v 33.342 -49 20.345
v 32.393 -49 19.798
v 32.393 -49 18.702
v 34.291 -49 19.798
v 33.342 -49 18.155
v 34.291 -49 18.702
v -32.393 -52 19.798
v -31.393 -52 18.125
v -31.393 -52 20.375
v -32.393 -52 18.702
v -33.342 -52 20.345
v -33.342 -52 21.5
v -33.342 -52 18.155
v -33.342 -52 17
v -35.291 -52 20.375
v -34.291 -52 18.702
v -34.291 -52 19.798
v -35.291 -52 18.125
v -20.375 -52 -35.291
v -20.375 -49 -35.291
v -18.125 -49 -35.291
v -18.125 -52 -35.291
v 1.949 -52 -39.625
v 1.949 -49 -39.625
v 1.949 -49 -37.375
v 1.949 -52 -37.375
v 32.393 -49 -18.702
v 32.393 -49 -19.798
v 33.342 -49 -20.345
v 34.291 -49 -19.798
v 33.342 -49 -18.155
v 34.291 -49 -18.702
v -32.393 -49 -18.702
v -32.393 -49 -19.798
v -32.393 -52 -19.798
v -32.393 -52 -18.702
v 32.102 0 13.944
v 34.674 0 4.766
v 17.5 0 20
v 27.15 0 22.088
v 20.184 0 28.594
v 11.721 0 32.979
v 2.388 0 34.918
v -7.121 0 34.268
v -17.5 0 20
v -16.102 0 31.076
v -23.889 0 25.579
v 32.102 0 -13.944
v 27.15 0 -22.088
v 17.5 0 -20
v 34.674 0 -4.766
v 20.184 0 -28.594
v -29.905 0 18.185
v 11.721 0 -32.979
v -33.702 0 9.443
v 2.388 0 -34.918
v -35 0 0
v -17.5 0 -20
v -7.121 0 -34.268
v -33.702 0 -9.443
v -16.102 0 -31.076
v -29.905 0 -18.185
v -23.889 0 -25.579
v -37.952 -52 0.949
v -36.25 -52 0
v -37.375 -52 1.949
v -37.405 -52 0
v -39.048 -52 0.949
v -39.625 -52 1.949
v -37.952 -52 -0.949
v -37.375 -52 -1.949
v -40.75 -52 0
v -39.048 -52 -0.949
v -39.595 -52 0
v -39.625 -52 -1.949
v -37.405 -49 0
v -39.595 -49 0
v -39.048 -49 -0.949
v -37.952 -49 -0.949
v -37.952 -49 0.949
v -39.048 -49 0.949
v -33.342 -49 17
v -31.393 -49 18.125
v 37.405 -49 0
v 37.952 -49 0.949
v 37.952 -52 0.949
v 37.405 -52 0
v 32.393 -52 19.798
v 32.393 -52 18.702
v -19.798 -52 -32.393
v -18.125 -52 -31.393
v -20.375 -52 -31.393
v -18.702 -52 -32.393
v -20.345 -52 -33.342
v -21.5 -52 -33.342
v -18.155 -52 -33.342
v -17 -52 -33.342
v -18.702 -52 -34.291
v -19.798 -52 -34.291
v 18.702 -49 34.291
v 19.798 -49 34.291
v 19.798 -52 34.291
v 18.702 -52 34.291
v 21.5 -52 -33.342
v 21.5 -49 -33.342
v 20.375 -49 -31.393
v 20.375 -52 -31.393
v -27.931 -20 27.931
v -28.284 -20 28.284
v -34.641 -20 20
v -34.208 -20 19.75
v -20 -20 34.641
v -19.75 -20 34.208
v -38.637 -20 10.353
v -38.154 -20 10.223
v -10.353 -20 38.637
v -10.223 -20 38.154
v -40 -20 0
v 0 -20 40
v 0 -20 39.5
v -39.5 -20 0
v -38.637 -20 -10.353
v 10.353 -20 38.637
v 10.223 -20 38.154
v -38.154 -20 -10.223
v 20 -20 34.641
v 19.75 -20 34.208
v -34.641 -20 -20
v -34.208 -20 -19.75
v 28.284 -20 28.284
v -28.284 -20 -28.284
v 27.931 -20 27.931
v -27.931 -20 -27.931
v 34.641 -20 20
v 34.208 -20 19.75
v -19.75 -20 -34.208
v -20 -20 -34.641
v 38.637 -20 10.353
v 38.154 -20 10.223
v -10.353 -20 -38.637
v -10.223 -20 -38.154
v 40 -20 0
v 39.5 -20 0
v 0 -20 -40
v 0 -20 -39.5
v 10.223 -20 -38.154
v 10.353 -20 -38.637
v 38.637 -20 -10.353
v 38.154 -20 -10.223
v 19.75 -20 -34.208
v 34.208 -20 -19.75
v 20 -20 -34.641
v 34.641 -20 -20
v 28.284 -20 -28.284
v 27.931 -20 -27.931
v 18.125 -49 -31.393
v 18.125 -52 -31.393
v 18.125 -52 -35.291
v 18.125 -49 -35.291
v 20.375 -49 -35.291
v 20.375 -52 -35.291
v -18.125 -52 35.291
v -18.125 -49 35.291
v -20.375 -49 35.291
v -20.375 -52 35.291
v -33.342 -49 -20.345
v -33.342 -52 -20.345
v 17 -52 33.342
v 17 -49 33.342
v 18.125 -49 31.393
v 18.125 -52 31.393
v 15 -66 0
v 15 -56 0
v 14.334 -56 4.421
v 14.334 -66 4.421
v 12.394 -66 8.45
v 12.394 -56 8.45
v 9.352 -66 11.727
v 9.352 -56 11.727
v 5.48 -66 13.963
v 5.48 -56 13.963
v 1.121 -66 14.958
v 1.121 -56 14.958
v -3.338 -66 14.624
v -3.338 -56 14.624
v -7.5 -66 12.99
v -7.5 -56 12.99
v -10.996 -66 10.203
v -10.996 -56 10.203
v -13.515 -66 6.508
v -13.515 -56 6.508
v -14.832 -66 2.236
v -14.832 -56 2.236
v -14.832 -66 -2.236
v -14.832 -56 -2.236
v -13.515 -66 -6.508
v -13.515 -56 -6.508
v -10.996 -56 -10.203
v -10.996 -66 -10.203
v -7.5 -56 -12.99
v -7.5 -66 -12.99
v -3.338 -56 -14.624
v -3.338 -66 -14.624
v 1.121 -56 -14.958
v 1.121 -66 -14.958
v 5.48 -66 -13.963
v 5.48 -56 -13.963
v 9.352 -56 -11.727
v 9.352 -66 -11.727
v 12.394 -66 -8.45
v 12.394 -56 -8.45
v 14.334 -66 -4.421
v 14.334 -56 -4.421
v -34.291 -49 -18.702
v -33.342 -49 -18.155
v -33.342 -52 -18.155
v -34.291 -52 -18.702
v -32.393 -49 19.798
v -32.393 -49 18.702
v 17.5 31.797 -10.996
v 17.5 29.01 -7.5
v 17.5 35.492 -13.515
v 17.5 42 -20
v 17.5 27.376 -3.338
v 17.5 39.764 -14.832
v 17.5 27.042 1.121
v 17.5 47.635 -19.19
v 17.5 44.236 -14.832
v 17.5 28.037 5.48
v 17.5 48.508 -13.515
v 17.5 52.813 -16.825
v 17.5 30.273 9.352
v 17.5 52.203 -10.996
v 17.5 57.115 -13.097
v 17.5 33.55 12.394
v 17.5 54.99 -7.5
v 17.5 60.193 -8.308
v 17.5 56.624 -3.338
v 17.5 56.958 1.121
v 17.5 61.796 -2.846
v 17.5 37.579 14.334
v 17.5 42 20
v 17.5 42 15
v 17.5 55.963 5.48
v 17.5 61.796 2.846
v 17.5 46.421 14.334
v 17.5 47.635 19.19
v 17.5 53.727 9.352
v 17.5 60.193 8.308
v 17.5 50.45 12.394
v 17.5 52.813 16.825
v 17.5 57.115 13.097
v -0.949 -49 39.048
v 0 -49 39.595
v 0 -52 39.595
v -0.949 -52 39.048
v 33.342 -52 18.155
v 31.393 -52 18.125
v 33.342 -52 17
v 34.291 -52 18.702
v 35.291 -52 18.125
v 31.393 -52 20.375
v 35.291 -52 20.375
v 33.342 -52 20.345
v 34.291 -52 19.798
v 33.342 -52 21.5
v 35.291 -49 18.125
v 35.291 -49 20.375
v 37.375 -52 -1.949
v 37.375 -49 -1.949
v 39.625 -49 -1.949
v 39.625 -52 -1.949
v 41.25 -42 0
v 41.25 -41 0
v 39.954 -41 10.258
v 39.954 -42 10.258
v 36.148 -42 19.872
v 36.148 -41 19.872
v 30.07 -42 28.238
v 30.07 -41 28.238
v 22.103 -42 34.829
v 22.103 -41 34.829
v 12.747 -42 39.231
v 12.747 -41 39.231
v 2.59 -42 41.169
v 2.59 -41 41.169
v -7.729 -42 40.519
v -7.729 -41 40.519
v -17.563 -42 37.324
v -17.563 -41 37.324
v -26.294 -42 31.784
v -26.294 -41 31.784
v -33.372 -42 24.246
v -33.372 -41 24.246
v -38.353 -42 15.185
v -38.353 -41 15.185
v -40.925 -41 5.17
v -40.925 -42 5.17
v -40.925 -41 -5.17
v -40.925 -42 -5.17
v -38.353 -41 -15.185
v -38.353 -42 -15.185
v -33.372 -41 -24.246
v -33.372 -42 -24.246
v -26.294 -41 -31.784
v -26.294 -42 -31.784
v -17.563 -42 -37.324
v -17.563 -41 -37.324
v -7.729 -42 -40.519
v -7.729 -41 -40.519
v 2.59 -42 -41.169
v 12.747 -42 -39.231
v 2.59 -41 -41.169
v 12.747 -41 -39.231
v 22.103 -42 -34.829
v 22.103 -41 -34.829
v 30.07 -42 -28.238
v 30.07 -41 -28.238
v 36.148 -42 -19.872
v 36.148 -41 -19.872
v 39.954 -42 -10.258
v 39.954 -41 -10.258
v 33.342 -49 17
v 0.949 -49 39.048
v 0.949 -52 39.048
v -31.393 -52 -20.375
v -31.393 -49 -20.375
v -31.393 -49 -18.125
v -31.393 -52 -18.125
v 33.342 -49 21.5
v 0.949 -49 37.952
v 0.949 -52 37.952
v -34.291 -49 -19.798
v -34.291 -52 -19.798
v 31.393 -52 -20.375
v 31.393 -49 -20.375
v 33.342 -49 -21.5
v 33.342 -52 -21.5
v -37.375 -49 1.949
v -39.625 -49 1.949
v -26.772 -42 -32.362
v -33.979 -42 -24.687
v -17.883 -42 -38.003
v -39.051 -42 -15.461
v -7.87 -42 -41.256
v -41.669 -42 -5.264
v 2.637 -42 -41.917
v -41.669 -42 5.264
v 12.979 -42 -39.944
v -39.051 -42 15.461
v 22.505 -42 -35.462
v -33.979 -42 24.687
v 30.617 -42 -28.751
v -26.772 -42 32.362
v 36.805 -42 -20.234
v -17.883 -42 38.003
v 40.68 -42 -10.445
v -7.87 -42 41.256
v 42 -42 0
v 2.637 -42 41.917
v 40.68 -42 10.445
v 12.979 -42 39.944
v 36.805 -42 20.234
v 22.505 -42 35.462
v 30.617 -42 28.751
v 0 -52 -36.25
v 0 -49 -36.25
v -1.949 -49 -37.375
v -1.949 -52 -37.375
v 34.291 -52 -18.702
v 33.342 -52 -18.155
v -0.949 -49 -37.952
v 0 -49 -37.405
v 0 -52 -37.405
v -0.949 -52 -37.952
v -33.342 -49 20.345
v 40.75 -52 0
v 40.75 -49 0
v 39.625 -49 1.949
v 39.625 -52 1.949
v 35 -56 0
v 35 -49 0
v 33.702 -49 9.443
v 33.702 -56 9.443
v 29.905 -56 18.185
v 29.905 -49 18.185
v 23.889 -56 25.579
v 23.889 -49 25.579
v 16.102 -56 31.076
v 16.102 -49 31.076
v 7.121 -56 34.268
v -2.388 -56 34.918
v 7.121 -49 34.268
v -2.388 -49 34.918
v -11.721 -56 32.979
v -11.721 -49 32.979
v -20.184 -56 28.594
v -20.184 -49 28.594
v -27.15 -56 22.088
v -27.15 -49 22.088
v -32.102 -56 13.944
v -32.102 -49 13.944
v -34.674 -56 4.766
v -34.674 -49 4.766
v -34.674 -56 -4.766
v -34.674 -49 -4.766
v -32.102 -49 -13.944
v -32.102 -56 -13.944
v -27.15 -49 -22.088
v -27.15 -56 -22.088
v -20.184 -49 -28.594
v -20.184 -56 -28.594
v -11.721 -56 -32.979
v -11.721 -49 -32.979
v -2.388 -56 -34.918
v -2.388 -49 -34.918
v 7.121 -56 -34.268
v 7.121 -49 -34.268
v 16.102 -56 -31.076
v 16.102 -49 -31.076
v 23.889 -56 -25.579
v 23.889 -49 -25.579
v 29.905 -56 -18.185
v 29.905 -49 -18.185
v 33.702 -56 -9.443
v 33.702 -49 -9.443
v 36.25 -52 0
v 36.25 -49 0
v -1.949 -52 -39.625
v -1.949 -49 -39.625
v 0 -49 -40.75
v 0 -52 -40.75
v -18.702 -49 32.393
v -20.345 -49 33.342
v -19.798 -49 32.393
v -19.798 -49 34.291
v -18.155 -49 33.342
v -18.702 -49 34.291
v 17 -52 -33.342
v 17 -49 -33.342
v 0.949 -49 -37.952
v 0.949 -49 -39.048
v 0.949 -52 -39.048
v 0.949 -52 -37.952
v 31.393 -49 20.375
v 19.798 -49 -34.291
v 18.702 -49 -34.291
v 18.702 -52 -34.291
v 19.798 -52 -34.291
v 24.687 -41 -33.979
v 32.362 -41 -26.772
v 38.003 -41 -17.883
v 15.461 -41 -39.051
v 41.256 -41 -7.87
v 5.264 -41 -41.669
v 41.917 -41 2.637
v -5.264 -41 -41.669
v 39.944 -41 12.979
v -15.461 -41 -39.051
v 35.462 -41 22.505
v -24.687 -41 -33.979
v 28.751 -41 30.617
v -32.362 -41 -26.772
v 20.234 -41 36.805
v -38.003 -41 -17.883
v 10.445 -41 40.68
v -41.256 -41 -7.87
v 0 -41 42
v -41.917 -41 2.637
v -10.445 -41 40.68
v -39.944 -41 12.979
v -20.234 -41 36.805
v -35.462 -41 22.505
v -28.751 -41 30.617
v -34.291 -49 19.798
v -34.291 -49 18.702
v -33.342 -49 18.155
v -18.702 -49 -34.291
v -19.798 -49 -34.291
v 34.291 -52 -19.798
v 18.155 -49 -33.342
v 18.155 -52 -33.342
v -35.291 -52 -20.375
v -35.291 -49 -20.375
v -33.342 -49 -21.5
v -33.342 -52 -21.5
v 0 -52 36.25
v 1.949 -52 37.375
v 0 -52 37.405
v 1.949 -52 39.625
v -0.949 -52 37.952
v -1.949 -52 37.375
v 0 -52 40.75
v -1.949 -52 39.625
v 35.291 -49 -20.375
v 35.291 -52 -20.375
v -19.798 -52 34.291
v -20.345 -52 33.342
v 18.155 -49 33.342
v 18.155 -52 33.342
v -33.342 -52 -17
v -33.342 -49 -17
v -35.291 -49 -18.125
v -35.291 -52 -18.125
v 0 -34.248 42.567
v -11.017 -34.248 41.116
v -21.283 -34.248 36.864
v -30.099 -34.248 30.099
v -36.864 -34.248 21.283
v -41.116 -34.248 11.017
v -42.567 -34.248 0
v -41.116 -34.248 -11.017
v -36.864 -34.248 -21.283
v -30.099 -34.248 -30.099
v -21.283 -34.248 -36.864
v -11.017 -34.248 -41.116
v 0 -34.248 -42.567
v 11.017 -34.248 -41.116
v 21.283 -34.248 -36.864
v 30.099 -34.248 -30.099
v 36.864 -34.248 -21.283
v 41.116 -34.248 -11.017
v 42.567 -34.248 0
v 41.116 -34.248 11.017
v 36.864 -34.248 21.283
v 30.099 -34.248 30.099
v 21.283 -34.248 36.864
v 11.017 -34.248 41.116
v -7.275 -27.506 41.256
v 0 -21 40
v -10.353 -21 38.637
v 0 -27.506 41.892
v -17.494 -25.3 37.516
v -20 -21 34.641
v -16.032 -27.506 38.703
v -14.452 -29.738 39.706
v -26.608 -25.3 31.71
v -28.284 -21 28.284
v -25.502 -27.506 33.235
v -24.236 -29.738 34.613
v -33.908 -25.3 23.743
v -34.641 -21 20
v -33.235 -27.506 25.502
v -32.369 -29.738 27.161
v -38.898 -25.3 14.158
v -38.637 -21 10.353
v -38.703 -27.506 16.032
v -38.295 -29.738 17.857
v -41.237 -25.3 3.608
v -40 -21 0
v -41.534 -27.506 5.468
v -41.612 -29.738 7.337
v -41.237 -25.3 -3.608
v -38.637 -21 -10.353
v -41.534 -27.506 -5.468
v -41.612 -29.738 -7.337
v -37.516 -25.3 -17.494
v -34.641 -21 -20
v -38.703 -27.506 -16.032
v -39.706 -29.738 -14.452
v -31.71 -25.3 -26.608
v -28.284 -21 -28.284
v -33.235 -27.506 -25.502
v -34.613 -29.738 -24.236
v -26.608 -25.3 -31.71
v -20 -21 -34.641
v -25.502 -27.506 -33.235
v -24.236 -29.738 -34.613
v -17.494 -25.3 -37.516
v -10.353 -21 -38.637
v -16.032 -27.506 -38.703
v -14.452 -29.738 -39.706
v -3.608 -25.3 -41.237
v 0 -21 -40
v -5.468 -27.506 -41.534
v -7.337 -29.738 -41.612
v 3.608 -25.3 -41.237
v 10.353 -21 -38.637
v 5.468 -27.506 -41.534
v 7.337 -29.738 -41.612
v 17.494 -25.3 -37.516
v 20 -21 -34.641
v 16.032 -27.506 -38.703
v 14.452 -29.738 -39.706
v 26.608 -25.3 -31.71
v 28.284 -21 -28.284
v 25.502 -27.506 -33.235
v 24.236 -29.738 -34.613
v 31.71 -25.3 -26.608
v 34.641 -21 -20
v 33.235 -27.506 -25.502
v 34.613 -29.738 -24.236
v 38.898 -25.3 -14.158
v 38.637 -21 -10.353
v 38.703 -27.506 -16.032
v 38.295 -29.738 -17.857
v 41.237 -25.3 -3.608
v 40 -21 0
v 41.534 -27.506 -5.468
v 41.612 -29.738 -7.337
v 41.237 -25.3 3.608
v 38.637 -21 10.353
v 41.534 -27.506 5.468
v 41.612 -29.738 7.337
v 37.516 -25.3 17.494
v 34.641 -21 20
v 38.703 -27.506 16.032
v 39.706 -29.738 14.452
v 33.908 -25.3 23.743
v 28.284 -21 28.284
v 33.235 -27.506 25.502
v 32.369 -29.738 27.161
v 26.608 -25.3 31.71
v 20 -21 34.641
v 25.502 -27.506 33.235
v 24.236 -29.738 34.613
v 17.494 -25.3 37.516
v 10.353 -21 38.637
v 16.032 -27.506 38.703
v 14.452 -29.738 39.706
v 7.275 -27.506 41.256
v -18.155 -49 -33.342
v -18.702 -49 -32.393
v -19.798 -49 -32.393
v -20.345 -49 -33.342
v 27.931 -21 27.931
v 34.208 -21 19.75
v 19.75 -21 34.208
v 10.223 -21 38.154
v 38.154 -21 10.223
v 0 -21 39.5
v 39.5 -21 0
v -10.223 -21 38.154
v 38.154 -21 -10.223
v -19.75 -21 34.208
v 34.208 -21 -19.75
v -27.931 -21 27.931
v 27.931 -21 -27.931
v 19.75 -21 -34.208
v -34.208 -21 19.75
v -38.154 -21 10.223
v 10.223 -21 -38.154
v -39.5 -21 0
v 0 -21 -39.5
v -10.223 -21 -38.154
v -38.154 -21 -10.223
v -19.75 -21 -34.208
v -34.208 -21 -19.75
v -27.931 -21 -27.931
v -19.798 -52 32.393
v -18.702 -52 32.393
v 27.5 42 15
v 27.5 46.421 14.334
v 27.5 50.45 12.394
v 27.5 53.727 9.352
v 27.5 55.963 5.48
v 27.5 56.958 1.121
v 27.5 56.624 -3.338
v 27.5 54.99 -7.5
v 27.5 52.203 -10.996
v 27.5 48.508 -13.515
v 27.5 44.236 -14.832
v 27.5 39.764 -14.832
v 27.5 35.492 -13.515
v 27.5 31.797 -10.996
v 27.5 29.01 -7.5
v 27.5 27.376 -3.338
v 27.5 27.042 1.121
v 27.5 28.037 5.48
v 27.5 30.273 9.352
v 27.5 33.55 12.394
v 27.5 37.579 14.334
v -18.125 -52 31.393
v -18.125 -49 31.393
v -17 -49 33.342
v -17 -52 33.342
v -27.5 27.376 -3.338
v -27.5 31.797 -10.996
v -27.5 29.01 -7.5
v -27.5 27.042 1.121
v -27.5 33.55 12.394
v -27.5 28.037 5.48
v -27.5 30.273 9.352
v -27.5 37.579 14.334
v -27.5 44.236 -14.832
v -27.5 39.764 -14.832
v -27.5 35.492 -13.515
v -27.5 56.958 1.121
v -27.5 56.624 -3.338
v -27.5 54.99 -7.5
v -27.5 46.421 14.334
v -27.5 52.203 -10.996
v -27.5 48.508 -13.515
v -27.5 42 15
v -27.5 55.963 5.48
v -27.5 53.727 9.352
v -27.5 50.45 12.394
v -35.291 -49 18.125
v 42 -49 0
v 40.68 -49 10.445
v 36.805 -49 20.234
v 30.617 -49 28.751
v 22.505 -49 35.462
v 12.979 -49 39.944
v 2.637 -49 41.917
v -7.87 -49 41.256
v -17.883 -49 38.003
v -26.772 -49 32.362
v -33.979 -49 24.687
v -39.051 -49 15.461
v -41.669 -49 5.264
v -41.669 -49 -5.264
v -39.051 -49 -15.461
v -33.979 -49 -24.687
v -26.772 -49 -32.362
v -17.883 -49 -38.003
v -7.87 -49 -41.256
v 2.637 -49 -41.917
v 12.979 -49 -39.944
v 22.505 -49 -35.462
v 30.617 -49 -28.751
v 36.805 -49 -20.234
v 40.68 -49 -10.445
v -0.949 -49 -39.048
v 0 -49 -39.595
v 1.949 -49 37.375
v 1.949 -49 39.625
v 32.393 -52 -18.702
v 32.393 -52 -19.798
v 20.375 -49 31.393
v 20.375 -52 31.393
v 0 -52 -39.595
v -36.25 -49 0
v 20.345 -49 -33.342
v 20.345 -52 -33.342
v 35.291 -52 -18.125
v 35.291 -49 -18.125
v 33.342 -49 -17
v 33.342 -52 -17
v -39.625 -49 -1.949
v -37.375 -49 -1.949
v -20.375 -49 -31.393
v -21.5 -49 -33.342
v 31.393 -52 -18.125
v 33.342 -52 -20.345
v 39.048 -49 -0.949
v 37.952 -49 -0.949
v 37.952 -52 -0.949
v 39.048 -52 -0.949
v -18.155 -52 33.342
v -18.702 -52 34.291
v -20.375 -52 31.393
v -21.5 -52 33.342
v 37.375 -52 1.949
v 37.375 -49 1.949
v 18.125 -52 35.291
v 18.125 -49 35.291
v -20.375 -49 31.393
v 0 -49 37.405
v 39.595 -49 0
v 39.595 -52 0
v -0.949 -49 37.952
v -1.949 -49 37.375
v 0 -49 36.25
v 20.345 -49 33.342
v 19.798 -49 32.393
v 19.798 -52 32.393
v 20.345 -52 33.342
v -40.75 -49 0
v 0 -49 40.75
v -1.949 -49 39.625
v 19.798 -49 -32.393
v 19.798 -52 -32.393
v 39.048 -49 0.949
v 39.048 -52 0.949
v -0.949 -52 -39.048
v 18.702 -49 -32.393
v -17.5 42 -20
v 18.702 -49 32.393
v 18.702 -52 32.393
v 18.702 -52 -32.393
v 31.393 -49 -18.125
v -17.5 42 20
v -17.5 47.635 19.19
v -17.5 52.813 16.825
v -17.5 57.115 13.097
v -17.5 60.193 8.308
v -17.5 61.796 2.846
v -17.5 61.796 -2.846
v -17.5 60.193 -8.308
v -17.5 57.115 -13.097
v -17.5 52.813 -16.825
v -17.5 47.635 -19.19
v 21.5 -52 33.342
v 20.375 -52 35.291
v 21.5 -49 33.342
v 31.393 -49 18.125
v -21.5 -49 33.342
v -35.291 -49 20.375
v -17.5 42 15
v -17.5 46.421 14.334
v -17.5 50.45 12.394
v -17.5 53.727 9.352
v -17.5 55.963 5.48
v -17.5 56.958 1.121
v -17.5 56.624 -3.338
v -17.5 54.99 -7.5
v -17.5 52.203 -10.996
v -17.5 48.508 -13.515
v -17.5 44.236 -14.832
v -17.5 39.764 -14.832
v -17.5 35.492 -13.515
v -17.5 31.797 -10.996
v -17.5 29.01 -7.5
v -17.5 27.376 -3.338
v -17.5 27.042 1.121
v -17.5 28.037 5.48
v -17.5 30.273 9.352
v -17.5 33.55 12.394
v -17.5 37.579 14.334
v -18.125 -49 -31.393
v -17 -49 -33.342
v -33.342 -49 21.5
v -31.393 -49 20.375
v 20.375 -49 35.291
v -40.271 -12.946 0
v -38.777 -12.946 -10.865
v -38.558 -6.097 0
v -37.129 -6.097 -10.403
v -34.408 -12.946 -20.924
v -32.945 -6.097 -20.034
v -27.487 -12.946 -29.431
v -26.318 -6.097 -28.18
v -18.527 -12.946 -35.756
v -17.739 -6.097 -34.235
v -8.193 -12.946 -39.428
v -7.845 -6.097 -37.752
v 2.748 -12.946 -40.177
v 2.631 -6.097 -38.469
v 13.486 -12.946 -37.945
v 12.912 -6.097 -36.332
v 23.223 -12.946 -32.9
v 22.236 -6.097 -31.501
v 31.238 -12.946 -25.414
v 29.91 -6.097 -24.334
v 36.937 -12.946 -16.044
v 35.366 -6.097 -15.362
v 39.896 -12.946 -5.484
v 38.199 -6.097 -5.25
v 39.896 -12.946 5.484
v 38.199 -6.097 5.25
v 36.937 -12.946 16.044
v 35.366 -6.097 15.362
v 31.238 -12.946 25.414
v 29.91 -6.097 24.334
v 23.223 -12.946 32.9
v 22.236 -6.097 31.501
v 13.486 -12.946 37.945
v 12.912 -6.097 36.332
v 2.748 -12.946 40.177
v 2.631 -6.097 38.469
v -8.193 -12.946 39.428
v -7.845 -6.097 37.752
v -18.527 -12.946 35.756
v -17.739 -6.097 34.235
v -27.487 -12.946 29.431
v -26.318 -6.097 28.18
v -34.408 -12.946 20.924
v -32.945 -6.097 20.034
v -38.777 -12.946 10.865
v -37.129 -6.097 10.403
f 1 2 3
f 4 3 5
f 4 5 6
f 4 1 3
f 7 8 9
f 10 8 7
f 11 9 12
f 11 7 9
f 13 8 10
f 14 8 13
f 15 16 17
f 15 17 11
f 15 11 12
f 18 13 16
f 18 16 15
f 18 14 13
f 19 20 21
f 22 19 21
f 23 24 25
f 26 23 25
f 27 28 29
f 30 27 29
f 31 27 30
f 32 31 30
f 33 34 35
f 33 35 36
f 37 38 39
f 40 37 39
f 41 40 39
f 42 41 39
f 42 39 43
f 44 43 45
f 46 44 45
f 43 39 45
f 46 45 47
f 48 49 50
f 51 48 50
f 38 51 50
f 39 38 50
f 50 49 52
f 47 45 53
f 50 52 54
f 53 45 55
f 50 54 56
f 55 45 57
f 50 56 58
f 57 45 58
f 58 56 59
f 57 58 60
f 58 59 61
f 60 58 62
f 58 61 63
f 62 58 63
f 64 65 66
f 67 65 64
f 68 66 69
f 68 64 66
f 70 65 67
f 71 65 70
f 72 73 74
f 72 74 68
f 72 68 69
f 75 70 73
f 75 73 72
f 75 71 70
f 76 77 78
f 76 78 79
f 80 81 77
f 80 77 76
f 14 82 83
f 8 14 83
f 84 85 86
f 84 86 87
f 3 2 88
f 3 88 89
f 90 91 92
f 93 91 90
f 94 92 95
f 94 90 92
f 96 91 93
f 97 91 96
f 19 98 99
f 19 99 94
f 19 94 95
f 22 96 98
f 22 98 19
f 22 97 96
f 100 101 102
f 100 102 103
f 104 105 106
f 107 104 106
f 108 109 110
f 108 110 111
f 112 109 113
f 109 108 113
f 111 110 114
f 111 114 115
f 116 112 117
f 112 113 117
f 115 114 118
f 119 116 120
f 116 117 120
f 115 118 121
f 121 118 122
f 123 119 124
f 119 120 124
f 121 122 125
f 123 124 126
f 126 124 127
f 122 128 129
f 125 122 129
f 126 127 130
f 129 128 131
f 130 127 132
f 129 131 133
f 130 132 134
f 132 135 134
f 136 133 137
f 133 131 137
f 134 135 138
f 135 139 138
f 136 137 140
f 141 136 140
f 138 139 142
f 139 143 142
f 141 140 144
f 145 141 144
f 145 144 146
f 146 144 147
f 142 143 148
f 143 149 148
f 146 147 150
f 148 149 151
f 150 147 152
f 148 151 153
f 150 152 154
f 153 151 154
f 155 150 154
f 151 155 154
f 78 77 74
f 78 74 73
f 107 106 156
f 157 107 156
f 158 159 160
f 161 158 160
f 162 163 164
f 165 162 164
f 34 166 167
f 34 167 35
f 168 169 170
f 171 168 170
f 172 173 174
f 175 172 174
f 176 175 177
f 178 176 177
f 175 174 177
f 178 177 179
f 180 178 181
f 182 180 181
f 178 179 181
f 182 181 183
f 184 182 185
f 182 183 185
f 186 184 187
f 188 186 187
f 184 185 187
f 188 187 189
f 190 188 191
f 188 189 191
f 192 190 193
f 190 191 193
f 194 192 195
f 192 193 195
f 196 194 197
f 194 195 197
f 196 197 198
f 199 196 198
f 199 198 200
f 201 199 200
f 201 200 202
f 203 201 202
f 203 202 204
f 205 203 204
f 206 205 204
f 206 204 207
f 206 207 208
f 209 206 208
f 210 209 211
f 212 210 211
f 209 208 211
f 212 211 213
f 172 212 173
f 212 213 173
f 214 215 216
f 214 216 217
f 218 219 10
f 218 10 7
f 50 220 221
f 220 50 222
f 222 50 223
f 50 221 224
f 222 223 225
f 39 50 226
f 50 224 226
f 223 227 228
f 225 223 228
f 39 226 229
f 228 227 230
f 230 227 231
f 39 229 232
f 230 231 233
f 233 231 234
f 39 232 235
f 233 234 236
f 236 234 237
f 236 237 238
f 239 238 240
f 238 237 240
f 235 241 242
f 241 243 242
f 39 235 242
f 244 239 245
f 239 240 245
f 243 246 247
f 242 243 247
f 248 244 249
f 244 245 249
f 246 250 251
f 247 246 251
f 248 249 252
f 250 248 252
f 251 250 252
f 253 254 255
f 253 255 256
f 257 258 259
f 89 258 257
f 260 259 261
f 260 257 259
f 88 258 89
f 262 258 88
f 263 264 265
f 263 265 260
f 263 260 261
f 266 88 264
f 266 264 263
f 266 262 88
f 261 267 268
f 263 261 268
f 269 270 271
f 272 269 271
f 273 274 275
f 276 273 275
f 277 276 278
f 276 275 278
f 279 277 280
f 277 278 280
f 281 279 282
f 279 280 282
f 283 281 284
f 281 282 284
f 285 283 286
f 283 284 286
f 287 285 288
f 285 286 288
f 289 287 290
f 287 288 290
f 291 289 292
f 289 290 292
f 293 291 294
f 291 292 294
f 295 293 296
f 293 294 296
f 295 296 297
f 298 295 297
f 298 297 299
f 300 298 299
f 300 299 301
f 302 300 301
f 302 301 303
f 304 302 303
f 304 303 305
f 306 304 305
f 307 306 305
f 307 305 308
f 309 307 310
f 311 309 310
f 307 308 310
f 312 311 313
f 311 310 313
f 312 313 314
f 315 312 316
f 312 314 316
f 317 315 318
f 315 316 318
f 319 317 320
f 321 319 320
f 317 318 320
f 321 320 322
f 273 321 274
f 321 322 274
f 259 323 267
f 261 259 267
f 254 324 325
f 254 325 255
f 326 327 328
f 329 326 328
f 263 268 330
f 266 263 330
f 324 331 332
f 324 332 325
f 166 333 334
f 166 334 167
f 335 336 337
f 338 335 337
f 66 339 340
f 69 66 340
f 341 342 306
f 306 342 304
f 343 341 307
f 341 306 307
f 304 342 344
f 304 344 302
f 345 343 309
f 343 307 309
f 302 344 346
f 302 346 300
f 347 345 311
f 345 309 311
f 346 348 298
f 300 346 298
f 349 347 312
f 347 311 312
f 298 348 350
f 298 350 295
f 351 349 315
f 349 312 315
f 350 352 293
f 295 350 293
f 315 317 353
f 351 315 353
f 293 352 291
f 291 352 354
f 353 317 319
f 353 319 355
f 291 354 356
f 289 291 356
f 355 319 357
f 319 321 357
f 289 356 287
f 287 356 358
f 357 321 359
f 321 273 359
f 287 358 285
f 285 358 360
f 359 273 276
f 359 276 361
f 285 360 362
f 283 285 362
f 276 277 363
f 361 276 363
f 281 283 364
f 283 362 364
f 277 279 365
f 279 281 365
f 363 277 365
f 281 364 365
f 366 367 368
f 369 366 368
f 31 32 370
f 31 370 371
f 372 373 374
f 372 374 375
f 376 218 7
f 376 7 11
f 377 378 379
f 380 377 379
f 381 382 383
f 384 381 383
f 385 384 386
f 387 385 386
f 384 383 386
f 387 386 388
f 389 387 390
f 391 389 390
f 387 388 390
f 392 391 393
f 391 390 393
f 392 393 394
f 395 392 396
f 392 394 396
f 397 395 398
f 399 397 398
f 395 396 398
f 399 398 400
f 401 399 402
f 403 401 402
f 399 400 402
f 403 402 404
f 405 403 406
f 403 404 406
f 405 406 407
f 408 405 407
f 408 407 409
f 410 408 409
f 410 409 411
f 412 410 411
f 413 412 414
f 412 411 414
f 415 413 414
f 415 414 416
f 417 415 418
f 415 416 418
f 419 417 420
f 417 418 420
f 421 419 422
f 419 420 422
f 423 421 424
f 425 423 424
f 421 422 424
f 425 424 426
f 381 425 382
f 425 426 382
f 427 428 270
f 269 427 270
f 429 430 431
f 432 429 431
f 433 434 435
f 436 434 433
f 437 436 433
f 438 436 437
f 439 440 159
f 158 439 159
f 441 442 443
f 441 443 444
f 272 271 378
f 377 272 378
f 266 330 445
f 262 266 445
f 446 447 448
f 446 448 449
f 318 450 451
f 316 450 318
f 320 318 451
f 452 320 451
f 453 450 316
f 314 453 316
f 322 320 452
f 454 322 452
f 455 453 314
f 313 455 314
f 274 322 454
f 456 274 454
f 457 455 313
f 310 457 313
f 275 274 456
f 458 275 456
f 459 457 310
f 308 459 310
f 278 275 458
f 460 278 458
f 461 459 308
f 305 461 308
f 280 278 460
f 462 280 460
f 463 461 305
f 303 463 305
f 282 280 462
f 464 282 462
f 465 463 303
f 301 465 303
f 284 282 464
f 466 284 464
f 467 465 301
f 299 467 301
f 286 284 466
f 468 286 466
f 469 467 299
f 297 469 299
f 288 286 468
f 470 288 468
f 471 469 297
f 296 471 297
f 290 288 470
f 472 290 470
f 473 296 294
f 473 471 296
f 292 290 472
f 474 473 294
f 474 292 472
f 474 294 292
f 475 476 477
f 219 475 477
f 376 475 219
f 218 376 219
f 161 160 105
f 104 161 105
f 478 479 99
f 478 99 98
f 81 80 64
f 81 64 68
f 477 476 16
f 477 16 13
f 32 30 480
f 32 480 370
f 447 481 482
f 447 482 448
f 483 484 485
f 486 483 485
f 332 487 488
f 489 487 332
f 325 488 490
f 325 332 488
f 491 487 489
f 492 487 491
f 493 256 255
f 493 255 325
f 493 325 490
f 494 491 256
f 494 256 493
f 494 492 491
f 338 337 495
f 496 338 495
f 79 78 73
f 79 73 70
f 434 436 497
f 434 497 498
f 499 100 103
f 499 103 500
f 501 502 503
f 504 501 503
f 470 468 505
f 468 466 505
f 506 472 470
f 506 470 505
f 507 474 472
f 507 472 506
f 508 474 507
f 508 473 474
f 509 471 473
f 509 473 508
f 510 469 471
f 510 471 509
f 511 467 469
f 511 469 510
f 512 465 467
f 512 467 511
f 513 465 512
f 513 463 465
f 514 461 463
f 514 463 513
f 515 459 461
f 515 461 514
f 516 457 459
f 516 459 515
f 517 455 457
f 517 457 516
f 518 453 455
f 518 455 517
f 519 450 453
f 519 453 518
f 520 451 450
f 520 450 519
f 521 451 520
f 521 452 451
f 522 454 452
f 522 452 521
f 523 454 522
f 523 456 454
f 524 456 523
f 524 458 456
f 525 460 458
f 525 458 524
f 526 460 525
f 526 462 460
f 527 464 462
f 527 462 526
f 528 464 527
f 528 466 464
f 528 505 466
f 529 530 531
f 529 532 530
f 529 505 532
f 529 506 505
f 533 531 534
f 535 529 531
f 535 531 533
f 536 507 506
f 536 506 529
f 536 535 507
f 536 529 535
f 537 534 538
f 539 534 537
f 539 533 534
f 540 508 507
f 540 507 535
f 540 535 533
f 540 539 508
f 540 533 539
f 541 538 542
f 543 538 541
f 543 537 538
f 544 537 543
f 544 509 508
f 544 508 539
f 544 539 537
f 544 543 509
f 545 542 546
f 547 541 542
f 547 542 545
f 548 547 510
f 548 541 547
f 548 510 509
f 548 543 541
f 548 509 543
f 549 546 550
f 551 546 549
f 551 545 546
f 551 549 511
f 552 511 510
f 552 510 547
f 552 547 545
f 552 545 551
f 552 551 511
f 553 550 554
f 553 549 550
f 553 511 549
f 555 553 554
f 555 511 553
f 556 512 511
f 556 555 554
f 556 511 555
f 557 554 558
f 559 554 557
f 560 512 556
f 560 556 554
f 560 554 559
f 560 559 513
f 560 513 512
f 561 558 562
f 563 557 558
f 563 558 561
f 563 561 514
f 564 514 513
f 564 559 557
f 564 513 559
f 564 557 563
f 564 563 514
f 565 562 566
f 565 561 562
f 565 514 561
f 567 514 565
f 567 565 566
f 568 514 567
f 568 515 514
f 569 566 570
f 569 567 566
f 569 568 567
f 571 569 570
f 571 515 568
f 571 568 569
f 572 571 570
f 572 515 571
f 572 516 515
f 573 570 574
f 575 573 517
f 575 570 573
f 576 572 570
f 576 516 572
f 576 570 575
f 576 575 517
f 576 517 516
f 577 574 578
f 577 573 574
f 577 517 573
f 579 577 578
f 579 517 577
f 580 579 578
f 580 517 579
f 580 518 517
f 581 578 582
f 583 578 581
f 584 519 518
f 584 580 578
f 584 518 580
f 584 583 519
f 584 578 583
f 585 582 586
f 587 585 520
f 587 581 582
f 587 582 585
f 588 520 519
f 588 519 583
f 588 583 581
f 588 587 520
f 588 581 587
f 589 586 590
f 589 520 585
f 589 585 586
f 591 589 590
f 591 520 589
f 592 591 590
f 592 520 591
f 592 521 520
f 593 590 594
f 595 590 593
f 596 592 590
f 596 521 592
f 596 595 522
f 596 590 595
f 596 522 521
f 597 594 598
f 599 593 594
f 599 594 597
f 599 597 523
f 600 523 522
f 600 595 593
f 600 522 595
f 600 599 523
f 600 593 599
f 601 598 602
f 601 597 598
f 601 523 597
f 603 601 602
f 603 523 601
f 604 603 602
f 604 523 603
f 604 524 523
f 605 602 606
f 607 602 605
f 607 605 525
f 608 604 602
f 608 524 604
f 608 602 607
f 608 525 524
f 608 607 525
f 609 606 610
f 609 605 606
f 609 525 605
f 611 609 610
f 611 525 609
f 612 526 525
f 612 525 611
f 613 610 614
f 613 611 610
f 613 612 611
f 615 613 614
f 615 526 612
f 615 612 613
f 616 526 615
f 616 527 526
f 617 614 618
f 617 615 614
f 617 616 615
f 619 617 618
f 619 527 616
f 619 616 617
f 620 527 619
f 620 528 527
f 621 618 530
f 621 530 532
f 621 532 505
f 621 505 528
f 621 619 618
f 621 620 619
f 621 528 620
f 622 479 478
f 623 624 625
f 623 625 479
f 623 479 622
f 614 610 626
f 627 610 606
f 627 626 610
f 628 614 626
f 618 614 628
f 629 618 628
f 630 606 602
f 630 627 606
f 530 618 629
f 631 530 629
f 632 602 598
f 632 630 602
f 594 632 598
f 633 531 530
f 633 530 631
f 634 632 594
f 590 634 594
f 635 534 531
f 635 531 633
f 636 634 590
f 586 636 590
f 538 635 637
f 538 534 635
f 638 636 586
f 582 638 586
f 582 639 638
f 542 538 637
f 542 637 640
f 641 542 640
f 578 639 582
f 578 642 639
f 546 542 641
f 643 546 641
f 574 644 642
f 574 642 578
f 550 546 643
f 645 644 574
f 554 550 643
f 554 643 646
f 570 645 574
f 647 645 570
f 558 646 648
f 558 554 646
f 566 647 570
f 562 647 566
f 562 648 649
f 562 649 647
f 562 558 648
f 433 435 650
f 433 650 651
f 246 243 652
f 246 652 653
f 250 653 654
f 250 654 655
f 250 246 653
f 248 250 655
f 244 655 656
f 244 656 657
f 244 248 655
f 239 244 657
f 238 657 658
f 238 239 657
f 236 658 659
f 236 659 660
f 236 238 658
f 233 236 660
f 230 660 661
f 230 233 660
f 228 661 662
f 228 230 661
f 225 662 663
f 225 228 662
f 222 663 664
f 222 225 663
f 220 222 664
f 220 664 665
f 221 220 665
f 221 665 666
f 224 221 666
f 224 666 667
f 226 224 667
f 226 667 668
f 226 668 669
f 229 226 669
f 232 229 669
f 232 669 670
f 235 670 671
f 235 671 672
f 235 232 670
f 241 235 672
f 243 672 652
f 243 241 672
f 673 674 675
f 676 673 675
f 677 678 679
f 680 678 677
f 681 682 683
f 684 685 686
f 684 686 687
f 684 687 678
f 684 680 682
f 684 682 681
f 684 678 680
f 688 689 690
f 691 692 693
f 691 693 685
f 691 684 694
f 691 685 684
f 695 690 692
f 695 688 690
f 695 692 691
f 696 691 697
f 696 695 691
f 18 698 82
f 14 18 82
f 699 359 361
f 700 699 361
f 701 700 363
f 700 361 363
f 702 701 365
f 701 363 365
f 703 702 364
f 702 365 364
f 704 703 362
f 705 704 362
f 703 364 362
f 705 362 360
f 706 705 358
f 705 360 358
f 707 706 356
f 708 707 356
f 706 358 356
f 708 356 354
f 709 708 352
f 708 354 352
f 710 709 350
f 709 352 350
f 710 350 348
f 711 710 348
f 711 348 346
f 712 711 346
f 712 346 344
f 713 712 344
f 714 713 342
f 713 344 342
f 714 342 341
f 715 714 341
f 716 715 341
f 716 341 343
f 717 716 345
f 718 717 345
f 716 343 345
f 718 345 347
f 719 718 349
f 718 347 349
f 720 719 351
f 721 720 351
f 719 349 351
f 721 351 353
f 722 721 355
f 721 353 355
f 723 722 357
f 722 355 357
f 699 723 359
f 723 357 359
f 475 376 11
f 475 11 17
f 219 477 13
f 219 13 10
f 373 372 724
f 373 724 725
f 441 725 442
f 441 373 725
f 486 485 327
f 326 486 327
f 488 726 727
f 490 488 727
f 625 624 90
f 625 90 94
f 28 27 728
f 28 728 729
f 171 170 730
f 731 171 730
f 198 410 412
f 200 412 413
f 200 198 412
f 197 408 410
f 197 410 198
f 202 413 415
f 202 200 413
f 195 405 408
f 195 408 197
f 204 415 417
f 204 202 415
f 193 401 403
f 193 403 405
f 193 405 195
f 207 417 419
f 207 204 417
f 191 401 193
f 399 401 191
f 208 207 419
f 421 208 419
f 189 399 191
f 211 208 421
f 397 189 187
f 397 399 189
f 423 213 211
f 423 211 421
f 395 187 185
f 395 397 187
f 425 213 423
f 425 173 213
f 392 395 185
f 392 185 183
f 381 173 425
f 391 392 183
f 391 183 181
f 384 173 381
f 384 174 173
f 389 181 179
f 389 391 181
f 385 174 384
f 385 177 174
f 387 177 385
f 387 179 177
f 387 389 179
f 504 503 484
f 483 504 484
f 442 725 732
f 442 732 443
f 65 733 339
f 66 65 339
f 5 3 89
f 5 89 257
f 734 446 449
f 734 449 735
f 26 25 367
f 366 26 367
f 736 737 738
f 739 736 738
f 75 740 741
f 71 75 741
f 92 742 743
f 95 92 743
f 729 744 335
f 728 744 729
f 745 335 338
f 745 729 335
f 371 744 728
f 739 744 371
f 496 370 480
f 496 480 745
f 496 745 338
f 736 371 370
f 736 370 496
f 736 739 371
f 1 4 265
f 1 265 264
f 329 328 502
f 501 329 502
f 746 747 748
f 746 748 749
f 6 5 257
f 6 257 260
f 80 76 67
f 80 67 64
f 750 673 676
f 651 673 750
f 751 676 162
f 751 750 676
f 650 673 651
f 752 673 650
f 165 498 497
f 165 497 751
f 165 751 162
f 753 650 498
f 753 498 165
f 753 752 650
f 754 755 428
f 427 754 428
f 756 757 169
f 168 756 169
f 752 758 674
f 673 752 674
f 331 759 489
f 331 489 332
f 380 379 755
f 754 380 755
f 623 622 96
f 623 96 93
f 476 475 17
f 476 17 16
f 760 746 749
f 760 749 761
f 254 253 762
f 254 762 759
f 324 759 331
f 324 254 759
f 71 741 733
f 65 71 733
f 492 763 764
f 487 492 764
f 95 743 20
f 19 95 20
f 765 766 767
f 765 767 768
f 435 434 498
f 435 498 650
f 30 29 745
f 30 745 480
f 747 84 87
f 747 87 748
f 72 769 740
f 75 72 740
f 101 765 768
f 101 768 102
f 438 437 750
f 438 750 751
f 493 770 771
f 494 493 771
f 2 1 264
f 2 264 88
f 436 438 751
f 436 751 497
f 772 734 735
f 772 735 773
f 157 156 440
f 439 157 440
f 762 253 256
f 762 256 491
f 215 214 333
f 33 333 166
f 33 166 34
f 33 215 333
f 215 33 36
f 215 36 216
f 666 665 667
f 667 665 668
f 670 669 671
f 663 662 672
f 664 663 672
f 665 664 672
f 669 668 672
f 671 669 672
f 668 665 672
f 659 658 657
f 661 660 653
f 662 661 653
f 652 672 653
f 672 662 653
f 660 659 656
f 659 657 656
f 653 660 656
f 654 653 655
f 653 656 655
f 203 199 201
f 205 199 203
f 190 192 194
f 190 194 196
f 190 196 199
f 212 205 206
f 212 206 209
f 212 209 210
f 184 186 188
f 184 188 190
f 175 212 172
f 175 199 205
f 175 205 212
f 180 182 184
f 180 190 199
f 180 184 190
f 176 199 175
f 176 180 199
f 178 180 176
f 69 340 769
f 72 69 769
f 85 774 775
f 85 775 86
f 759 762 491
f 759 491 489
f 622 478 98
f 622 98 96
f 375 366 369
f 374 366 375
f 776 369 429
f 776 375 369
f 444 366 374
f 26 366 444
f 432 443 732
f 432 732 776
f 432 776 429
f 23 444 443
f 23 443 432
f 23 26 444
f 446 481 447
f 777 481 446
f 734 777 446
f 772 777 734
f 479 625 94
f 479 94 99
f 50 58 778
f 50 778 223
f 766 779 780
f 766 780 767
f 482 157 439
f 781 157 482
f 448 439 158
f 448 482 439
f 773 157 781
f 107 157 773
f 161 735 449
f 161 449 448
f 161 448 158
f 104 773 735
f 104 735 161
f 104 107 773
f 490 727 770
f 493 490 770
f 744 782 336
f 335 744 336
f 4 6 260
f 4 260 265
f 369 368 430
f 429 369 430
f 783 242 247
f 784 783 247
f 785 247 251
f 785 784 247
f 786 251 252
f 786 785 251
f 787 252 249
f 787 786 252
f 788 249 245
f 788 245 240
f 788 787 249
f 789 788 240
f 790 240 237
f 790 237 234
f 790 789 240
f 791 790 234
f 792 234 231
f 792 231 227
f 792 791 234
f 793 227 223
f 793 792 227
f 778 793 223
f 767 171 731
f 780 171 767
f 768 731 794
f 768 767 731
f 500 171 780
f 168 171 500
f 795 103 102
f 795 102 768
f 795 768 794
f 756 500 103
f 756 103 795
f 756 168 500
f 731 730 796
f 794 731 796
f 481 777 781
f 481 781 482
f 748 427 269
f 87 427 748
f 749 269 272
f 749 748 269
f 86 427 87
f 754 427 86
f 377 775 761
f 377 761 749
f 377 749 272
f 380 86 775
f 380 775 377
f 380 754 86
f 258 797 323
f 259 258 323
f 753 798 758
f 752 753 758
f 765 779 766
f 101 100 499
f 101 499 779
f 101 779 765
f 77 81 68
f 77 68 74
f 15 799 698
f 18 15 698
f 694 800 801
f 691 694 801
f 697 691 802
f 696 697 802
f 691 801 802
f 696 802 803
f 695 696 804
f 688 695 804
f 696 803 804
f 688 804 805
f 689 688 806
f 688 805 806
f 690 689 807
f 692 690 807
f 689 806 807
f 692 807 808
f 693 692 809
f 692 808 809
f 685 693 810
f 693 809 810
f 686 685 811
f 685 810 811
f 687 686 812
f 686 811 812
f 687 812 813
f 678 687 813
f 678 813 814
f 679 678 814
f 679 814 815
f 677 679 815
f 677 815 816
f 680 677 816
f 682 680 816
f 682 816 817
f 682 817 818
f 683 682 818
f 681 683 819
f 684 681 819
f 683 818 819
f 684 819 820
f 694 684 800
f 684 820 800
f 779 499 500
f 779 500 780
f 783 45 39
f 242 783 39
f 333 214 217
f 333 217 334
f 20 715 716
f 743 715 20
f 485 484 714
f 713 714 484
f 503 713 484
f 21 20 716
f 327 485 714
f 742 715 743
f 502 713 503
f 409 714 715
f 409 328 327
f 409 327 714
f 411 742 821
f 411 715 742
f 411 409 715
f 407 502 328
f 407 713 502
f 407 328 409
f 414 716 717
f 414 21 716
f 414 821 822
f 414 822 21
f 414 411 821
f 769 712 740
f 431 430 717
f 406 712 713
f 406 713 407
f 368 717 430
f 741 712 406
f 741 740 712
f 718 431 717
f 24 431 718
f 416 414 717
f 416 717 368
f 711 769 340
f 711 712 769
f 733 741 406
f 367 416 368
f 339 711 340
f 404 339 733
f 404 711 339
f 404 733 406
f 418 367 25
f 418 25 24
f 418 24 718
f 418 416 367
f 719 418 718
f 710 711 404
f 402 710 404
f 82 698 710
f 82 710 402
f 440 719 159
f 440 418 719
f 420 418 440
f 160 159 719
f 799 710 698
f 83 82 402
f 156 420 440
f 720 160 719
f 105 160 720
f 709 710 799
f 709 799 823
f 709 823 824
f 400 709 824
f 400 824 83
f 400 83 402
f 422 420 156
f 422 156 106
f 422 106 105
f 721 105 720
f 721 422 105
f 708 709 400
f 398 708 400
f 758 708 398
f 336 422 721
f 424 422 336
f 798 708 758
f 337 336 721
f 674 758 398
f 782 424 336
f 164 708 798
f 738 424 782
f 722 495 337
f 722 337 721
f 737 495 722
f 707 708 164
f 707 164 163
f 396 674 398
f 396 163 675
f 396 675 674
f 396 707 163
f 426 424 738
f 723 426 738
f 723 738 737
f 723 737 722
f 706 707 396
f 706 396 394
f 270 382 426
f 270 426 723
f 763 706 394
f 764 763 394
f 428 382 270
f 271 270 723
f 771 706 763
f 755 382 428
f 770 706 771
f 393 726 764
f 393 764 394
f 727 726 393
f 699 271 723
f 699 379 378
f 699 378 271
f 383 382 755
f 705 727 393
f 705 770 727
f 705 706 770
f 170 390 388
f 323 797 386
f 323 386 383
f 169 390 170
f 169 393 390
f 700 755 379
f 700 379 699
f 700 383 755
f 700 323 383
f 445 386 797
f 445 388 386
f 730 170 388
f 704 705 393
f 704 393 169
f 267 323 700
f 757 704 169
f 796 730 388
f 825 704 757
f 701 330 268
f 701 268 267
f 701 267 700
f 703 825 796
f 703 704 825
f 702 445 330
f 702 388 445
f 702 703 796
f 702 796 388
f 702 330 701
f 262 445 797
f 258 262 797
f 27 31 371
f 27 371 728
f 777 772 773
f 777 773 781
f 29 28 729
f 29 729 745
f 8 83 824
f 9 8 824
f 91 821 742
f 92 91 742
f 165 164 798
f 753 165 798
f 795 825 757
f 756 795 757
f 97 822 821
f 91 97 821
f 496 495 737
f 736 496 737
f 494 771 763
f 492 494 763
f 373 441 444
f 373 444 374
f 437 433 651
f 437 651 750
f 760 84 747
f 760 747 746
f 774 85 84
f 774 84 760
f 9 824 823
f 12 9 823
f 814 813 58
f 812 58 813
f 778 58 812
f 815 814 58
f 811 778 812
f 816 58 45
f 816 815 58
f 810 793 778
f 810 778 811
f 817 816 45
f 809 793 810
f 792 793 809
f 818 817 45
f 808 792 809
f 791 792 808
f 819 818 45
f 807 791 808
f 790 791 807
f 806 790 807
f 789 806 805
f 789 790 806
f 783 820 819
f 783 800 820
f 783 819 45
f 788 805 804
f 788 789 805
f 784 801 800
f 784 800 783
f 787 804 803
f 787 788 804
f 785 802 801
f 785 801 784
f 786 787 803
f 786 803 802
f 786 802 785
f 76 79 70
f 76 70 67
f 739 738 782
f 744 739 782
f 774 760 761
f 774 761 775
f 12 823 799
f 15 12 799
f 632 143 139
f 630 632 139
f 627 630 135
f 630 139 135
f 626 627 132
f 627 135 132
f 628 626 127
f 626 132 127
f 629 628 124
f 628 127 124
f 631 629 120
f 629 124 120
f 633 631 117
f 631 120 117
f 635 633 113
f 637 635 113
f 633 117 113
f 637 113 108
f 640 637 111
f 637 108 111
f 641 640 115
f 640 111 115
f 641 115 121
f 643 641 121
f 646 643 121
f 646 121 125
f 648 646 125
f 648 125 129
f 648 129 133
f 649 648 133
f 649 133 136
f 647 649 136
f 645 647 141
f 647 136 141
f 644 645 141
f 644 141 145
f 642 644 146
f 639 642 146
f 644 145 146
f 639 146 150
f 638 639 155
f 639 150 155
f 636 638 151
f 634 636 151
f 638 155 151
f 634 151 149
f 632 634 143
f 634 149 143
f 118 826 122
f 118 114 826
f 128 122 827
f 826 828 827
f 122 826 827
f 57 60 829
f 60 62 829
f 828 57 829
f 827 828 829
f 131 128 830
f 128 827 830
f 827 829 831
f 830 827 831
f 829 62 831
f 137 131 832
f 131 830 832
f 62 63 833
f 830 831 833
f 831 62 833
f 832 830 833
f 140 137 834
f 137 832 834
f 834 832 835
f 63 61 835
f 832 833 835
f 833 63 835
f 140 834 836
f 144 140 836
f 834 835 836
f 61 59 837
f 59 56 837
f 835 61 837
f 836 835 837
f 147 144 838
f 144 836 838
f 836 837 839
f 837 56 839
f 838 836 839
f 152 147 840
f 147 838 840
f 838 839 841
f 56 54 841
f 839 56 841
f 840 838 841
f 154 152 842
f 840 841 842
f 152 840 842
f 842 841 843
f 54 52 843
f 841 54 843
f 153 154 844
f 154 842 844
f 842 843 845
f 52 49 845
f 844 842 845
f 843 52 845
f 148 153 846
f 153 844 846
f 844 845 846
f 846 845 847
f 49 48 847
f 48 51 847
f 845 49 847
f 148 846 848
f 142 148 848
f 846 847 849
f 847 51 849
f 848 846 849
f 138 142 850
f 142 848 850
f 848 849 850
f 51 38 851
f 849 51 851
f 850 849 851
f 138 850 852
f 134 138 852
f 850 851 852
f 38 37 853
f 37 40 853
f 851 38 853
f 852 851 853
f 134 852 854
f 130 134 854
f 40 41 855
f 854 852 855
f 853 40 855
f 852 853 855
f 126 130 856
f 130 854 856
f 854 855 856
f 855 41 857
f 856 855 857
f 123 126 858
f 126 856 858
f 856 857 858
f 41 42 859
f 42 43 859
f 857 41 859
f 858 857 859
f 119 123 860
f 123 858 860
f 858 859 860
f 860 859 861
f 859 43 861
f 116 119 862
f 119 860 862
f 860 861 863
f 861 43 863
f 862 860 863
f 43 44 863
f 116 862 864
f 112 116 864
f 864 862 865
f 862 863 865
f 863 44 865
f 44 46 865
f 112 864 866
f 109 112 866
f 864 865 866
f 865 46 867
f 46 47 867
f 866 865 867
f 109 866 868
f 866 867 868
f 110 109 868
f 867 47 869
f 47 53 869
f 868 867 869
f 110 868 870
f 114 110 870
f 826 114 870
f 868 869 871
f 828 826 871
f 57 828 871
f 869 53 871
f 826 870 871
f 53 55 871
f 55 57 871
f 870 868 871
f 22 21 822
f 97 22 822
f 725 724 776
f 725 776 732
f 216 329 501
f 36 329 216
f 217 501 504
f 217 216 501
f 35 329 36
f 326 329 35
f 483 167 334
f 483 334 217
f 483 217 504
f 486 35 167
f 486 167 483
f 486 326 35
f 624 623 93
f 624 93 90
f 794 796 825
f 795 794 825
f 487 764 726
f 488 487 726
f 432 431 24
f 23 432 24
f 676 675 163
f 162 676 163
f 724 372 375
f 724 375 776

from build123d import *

# Parameters (mm, degrees)
SKETCH2_R           = 39.5
BOSS_EXTRUDE1_DEPTH = 1
SKETCH4_R           = 41.25
BOSS_EXTRUDE2_DEPTH = 1
SKETCH5_R           = 42
BOSS_EXTRUDE3_DEPTH = 7
SKETCH6_R           = 35
BOSS_EXTRUDE4_DEPTH = 7
BOSS_EXTRUDE5_DEPTH = 3
CIRPATTERN1_COUNT   = 12
SKETCH8_R           = 15
BOSS_EXTRUDE6_DEPTH = 10
SKETCH9_W           = 35
SKETCH9_H           = 40
BOSS_EXTRUDE7_DEPTH = 42
BOSS_EXTRUDE8_DEPTH = 35
SKETCH11_R          = 15
BOSS_EXTRUDE9_DEPTH = 10


with BuildPart() as part:
    # Sketch1 → Revolve1 (revolve)
    with BuildSketch(Plane.XY):
        with BuildLine():
            Line((-35, 0), (0, 0))
            Line((0, 0), (0, -20))
            Line((0, -20), (-40, -20))
            ThreePointArc((-40, -20), (-39.657515479, -9.46062113), (-35, 0))
        make_face()
    revolve(axis=Axis((0, 0, 0), (0, -1, 0)))

    # Sketch2 → Boss-Extrude1 (add)
    with BuildSketch(Plane.XZ.offset(20)):
        Circle(SKETCH2_R)
    extrude(amount=BOSS_EXTRUDE1_DEPTH)

    # Sketch3 → Revolve2 (revolve)
    with BuildSketch(Plane(origin=(0, 0, 0), x_dir=(0, 0, -1), z_dir=(1, 0, 0))):
        with BuildLine():
            Line((0, -21), (-40, -21))
            ThreePointArc((-40, -21), (-42.384109041, -30.861589096), (-42, -41))
            Line((-42, -41), (0, -41))
            Line((0, -41), (0, -21))
        make_face()
    revolve(axis=Axis((0, -21, 0), (0, -1, 0)))

    # Sketch4 → Boss-Extrude2 (add)
    with BuildSketch(Plane.XZ.offset(41)):
        Circle(SKETCH4_R)
    extrude(amount=BOSS_EXTRUDE2_DEPTH)

    # Sketch5 → Boss-Extrude3 (add)
    with BuildSketch(Plane.XZ.offset(42)):
        Circle(SKETCH5_R)
    extrude(amount=BOSS_EXTRUDE3_DEPTH)

    # Sketch6 → Boss-Extrude4 (add)
    with BuildSketch(Plane.XZ.offset(49)):
        Circle(SKETCH6_R)
    extrude(amount=BOSS_EXTRUDE4_DEPTH)

    # Sketch7 → Boss-Extrude5 (add)
    with BuildSketch(Plane.XZ.offset(49)):
        Polygon((40.75, 0), (39.625, 1.948557159), (37.375, 1.948557159), (36.25, 0), (37.375, -1.948557159), (39.625, -1.948557159), align=None)
        Polygon((39.047649731, 0.948557159), (37.952350269, 0.948557159), (37.404700538, 0), (37.952350269, -0.948557159), (39.047649731, -0.948557159), (39.595299462, 0), align=None, mode=Mode.SUBTRACT)
    boss_extrude5 = extrude(amount=BOSS_EXTRUDE5_DEPTH)

    # CirPattern1: Boss-Extrude5 ×12 about axis
    cirpattern1_axis = Axis((0, 0, 0), (0, 1, 0))
    for i in range(1, CIRPATTERN1_COUNT):
        add(boss_extrude5.rotate(cirpattern1_axis, i * 360 / CIRPATTERN1_COUNT))

    # Sketch8 → Boss-Extrude6 (add)
    with BuildSketch(Plane.XZ.offset(56)):
        Circle(SKETCH8_R)
    extrude(amount=BOSS_EXTRUDE6_DEPTH)

    # Sketch9 → Boss-Extrude7 (add)
    with BuildSketch(Plane(origin=(0, 0, 0), x_dir=(1, 0, 0), z_dir=(0, 1, 0))):
        Rectangle(SKETCH9_W, SKETCH9_H)
    extrude(amount=BOSS_EXTRUDE7_DEPTH)

    # Sketch10 → Boss-Extrude8 (add)
    with BuildSketch(Plane.ZY.offset(17.5)):
        with BuildLine():
            Line((-20, 42), (20, 42))
            ThreePointArc((20, 42), (0, 62), (-20, 42))
        make_face()
    extrude(amount=-BOSS_EXTRUDE8_DEPTH)

    # Sketch11 → Boss-Extrude9 (add)
    with BuildSketch(Plane.ZY.offset(17.5)):
        with Locations((0, 42)):
            Circle(SKETCH11_R)
    boss_extrude9 = extrude(amount=BOSS_EXTRUDE9_DEPTH)

    # Mirror1: Boss-Extrude9 across plane
    add(boss_extrude9.mirror(Plane(origin=(0, 0, 0), x_dir=(0, 0, 1), z_dir=(1, 0, 0))))


solid = part.part
